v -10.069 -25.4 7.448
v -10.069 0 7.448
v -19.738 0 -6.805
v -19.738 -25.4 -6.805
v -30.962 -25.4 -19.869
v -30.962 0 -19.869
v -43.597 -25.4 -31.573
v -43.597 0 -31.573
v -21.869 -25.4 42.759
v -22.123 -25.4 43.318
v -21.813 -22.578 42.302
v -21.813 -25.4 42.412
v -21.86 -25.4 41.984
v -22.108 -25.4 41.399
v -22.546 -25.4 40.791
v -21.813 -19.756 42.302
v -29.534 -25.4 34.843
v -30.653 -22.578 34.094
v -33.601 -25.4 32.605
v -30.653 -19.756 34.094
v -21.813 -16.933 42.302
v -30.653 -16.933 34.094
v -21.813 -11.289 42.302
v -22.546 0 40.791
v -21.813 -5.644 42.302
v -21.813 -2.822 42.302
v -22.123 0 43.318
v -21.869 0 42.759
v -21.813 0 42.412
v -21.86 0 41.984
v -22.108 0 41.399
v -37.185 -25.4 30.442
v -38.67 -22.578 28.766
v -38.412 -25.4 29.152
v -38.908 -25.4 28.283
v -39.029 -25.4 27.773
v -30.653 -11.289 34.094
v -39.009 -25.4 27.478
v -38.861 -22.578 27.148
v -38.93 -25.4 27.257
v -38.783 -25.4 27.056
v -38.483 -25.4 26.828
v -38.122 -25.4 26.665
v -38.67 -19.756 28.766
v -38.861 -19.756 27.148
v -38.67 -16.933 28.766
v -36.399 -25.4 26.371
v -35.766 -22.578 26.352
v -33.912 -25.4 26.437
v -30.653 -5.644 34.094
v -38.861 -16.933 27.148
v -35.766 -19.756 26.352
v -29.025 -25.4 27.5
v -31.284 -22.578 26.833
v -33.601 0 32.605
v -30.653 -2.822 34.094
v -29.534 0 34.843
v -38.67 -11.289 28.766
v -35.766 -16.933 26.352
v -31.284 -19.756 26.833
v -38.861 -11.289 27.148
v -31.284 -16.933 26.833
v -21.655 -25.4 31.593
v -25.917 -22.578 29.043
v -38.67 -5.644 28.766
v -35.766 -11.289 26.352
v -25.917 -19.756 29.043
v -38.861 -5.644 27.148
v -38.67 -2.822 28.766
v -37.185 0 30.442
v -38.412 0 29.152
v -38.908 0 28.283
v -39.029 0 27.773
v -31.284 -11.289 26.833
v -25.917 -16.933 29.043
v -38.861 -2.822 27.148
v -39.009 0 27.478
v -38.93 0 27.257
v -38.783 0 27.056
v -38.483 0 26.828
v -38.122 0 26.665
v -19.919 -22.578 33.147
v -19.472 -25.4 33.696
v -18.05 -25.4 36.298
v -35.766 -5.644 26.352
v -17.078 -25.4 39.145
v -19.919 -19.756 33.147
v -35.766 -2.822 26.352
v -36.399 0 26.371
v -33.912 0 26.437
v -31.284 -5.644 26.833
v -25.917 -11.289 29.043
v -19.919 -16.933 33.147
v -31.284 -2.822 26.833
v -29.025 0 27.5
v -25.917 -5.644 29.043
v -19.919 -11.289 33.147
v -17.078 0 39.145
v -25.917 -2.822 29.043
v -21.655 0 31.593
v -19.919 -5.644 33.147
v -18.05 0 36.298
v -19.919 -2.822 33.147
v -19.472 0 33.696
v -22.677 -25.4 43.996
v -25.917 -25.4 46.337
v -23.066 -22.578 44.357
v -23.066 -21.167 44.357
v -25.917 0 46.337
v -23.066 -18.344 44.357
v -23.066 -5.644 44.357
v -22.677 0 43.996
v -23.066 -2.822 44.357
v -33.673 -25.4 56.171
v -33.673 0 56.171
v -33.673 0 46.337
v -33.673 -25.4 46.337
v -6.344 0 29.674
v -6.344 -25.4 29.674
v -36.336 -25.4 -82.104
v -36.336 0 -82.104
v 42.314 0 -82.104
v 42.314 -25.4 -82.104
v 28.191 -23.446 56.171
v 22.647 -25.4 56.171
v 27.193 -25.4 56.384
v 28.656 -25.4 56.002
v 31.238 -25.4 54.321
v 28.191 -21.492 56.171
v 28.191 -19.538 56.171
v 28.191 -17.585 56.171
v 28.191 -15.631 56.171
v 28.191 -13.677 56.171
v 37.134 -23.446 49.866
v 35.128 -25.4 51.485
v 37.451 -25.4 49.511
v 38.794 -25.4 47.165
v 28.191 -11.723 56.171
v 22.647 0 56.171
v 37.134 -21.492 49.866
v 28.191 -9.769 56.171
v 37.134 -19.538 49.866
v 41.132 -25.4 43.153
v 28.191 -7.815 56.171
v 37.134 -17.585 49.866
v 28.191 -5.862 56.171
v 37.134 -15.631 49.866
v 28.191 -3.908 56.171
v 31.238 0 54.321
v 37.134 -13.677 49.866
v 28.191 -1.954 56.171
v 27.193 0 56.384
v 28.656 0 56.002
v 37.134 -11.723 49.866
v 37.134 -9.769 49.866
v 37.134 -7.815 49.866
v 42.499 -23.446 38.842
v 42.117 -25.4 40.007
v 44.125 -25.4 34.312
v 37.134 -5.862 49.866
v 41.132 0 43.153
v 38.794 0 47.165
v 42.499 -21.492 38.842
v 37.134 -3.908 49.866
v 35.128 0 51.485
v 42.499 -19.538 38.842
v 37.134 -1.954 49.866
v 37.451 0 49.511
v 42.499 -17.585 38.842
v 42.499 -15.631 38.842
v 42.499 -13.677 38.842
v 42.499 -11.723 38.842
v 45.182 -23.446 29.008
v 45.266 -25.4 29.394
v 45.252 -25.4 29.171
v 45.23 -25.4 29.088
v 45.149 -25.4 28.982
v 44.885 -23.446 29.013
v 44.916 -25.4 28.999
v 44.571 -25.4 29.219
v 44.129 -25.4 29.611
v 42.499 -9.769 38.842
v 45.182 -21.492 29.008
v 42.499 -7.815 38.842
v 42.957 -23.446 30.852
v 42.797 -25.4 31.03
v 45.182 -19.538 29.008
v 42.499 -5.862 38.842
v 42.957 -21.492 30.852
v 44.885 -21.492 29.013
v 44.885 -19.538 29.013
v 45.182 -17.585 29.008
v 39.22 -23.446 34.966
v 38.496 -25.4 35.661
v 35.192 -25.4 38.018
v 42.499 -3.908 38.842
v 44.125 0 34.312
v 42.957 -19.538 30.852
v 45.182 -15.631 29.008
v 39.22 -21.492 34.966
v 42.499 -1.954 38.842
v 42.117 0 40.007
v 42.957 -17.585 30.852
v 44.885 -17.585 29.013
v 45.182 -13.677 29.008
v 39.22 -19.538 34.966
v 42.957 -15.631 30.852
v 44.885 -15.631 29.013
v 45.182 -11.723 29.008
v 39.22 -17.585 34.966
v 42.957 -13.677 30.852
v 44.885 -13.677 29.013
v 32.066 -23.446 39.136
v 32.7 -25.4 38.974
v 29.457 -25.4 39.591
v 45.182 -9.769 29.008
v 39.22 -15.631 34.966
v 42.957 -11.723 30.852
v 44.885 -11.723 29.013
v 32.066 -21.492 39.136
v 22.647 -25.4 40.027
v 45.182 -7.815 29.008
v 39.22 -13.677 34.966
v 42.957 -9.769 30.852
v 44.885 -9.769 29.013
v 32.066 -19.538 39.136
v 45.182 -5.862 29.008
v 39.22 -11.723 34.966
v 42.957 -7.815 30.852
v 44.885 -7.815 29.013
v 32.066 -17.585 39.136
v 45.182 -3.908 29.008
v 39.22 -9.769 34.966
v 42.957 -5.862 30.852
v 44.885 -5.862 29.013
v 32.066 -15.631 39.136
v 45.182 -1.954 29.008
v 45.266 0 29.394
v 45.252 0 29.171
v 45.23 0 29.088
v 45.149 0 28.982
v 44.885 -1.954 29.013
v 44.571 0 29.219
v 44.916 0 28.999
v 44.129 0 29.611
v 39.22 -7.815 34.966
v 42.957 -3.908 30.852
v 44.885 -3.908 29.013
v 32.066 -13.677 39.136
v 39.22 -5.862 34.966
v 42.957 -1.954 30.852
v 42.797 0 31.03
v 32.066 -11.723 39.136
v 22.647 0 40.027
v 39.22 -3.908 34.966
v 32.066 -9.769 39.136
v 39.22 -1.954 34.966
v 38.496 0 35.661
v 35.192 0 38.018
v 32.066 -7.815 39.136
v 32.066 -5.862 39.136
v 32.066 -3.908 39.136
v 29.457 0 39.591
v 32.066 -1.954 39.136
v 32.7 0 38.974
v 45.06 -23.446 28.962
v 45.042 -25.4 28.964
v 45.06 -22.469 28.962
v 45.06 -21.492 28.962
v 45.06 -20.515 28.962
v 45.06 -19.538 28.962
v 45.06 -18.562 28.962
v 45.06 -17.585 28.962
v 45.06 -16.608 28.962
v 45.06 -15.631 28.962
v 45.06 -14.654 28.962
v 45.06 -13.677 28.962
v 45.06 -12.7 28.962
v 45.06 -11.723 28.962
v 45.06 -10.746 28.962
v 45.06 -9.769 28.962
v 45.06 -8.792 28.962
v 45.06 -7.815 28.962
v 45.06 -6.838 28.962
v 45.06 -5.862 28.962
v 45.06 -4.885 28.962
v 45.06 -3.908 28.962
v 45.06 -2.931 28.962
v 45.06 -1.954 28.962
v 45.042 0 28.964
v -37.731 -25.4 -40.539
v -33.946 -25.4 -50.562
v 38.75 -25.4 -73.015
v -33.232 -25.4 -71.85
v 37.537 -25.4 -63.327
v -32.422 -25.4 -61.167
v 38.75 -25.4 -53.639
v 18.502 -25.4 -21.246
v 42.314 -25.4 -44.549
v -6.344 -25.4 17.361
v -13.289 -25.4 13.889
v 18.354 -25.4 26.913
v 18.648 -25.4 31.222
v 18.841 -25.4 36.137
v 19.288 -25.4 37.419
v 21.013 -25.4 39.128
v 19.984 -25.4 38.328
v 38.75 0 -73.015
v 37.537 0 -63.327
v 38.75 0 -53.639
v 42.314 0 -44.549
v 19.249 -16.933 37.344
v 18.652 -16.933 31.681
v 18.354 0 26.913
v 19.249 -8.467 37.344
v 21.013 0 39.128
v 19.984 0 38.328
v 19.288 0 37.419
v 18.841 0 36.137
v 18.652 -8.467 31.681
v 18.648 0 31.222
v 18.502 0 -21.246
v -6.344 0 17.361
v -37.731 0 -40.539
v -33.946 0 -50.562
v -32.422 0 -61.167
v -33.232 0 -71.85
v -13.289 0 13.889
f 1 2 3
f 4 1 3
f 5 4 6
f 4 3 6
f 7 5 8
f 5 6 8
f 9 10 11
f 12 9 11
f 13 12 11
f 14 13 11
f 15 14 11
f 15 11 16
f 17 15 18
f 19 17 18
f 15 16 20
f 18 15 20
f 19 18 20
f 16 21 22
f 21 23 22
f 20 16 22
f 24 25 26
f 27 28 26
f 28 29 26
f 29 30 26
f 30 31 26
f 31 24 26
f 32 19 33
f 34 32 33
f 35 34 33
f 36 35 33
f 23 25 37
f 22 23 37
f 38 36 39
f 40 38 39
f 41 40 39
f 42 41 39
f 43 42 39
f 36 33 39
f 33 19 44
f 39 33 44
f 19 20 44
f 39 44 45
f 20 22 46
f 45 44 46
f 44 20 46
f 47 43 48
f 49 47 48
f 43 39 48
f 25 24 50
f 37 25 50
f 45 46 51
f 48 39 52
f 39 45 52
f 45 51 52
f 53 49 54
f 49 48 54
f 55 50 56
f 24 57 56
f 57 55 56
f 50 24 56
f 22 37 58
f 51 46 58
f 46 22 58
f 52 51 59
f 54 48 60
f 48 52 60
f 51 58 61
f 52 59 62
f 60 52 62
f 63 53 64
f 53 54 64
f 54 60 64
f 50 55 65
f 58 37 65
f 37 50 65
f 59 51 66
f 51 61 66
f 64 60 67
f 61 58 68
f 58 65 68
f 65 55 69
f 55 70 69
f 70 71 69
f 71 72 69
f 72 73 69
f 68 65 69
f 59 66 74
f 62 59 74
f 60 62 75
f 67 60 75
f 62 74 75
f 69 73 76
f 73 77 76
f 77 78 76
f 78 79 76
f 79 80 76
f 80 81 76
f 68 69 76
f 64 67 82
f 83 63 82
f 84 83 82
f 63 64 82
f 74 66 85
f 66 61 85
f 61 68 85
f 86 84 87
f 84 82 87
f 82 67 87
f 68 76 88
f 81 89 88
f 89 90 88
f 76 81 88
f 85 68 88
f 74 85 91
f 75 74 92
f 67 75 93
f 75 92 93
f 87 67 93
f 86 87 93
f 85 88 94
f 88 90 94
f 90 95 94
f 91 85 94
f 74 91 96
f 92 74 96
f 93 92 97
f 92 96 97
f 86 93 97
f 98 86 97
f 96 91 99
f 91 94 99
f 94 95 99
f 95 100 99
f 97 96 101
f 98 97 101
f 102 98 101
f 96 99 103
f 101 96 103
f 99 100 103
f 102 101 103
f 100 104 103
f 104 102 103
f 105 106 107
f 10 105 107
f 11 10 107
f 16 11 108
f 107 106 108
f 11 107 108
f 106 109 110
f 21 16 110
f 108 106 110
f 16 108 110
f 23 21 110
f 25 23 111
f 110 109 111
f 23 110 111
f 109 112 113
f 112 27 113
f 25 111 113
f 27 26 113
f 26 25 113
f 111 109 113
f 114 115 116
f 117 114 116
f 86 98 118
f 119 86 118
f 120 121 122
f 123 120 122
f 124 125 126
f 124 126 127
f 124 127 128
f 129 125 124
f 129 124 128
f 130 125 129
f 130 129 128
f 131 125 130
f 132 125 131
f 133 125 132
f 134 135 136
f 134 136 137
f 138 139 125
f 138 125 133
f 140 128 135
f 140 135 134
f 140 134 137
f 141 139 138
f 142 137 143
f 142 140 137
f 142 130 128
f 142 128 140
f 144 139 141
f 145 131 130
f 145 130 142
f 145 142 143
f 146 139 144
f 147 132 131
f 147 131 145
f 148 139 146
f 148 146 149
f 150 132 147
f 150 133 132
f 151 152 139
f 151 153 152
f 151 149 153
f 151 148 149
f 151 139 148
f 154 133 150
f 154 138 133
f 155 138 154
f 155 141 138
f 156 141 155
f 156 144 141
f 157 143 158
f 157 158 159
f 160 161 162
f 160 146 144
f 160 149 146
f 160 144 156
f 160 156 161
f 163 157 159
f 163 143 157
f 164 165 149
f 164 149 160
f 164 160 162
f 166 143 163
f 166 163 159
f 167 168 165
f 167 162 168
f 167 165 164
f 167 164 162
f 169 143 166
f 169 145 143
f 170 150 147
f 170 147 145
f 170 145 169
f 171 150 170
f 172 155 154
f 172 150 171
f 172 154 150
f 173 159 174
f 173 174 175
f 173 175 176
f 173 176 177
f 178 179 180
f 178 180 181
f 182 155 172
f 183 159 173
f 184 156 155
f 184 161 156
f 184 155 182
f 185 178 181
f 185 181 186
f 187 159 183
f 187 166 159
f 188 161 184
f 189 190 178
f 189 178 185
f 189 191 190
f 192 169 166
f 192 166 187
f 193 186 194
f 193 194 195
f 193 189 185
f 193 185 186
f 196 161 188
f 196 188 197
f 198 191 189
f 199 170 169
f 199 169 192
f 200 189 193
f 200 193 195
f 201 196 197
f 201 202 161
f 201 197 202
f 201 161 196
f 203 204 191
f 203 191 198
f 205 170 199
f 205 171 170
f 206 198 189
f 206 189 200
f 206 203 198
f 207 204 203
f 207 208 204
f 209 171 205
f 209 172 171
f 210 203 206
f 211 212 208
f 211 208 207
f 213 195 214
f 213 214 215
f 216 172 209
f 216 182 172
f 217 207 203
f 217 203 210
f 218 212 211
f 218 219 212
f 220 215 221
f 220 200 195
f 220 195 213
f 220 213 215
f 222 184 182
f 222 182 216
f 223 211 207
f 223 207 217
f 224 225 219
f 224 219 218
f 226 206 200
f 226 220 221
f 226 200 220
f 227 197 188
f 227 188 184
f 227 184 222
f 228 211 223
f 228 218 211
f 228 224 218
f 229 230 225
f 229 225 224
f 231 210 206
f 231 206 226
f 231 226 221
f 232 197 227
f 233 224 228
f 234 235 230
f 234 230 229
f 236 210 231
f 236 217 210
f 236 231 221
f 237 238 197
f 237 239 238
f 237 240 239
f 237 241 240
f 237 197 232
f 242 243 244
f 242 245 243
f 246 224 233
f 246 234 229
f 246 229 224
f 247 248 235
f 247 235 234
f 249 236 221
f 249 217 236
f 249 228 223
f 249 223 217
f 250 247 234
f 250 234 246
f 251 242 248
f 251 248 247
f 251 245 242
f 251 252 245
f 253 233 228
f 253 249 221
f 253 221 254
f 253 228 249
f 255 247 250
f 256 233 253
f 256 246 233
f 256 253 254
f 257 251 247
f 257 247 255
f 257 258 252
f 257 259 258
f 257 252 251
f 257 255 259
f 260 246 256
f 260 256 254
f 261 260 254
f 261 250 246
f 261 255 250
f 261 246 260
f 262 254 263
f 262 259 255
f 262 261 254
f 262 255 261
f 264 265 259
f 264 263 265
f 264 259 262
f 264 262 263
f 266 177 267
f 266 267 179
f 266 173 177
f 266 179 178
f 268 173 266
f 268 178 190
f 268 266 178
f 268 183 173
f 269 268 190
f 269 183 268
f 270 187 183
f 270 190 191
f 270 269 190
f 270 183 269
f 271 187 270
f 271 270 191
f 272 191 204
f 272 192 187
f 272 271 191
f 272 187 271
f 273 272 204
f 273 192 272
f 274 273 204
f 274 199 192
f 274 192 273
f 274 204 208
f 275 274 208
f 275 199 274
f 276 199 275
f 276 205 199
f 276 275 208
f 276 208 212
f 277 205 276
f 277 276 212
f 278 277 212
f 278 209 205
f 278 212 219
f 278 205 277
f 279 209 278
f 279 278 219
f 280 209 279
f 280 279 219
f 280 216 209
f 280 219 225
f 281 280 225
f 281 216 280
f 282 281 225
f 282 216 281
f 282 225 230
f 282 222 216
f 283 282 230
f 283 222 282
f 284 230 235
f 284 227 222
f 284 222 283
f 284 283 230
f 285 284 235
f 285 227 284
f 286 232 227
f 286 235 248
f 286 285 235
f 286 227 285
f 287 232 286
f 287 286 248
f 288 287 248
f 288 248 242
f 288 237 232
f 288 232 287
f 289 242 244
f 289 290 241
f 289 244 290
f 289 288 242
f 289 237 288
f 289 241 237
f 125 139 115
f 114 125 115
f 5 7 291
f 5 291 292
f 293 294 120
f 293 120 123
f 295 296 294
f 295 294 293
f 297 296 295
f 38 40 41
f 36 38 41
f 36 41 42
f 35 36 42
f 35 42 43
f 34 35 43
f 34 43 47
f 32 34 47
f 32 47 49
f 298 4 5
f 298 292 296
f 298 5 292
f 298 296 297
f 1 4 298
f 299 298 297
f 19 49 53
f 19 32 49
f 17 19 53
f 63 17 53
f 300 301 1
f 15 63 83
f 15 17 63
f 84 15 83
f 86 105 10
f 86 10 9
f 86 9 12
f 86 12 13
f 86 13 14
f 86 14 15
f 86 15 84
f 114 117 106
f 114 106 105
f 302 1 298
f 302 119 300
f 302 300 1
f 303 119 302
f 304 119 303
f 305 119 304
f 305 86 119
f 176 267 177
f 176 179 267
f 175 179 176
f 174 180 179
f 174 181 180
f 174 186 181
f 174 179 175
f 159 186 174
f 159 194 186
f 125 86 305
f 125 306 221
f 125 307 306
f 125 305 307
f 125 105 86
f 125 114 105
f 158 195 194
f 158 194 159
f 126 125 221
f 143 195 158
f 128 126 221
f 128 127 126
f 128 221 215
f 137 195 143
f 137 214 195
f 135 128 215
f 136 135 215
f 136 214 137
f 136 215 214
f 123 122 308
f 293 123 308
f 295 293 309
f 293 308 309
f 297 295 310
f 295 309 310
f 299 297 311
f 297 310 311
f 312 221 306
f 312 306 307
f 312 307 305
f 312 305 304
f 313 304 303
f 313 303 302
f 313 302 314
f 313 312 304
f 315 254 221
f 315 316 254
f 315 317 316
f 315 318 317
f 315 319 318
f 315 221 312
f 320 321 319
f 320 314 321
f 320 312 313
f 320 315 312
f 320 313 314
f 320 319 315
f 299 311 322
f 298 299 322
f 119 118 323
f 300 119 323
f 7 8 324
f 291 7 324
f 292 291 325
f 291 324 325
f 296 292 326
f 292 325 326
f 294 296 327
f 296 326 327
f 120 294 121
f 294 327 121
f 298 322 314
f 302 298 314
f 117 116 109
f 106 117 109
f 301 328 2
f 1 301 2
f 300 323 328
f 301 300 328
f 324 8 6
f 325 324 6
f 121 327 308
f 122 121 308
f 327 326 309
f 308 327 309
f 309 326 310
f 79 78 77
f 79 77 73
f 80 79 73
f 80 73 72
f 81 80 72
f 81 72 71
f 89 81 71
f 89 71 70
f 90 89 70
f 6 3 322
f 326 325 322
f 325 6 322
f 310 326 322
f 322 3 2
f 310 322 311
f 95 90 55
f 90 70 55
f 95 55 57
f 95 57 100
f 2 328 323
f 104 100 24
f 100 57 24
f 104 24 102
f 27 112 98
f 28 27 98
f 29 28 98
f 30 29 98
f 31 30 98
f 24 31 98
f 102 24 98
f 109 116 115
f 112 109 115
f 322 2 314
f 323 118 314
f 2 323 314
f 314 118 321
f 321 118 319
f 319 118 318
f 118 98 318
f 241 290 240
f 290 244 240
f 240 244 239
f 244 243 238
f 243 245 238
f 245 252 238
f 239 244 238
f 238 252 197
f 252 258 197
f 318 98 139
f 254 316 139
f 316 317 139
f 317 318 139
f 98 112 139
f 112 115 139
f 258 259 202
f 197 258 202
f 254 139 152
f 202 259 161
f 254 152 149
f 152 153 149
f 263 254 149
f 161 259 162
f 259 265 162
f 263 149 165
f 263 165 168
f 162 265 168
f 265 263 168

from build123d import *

# Parameters (mm, degrees)
F1_DEPTH = 25.4


with BuildPart() as f1:
    # F0 (on Front) → F1 (new body)
    with BuildSketch(Plane.XZ):
        with BuildLine():
            Line((22.6471498609, 56.1708956957), (-33.6727388203, 56.1708956957))
            Line((-33.6727388203, 56.1708956957), (-33.6727388203, 46.3372655213))
            Line((-33.6727388203, 46.3372655213), (-25.9174183011, 46.3372655213))
            add(Edge.make_bspline(
                [(-25.9174183011, 46.3372655213), (-23.8384248423, 45.0250805606), (-19.6311358124, 42.3695929412), (-26.4548745148, 37.7604244944), (-30.251269397, 33.7022554926), (-36.9185112274, 31.5489744559), (-40.9623640059, 25.8500064631), (-30.4127234084, 26.4631393418), (-26.2043699608, 28.9562646016), (-19.1149018323, 32.5915279181), (-17.7463418011, 36.9940384372), (-17.0775894076, 39.1453430057)],
                knots=[0, 0, 0, 0, 0.1069746269, 0.2164860944, 0.326296391, 0.4459968404, 0.5346841258, 0.6574790218, 0.7649065343, 0.8851206273, 1, 1, 1, 1], degree=3))
            Line((-17.0775894076, 39.1453430057), (-6.3435137272, 29.674096033))
            Line((-6.3435137272, 29.674096033), (-6.3435137272, 17.36147888))
            Line((-6.3435137272, 17.36147888), (-13.2890921086, 13.8886868954))
            Line((-13.2890921086, 13.8886868954), (-10.0688668171, 7.4482414939))
            ThreePointArc((-10.0688668171, 7.4482414939), (-25.1639599361, -13.4965769846), (-43.5970760882, -31.5732881427))
            ThreePointArc((-43.5970760882, -31.5732881427), (-32.8946720473, -55.8225948104), (-36.3357998431, -82.1043178439))
            Line((-36.3357998431, -82.1043178439), (42.3144139349, -82.1043178439))
            ThreePointArc((42.3144139349, -82.1043178439), (37.5371457467, -63.3268244565), (42.3144139349, -44.549331069))
            Line((42.3144139349, -44.549331069), (18.5016249106, -21.2456751615))
            Line((18.5016249106, -21.2456751615), (18.3543357998, 26.9130244851))
            add(Edge.make_bspline(
                [(22.6471498609, 40.027089417), (21.2792029286, 39.3295081026), (18.3426400433, 37.8320147795), (18.8097058732, 31.5486892751), (18.5016249106, 28.412426806), (18.3543357998, 26.9130244851)],
                knots=[0, 0, 0, 0, 0.3127842622, 0.6714519647, 1, 1, 1, 1], degree=3))
            add(Edge.make_bspline(
                [(22.6471498609, 56.1708956957), (24.6242757207, 56.4167795131), (28.4765464917, 56.8958643616), (32.1259487873, 53.3392921925), (37.4867669651, 50.1030116949), (38.4358992651, 47.6178089471), (40.751216997, 43.8553132507), (41.3864216625, 42.7681305631), (42.337306284, 38.8063167025), (44.181487922, 34.8741808016), (44.0560653004, 33.8002724839), (46.8419924844, 25.5814490103), (38.8226009812, 36.3773031204), (32.4243539132, 39.6728607383), (25.9777945234, 39.9064199647), (22.6471498609, 40.027089417)],
                knots=[0, 0, 0, 0, 0.0835853039, 0.1628592441, 0.2495253229, 0.3090454849, 0.3812735114, 0.4222536655, 0.4937216176, 0.5660430876, 0.6098018867, 0.6855943774, 0.7886561121, 0.8908082049, 1, 1, 1, 1], degree=3))
        make_face()
    extrude(amount=F1_DEPTH)


solid = f1.part
